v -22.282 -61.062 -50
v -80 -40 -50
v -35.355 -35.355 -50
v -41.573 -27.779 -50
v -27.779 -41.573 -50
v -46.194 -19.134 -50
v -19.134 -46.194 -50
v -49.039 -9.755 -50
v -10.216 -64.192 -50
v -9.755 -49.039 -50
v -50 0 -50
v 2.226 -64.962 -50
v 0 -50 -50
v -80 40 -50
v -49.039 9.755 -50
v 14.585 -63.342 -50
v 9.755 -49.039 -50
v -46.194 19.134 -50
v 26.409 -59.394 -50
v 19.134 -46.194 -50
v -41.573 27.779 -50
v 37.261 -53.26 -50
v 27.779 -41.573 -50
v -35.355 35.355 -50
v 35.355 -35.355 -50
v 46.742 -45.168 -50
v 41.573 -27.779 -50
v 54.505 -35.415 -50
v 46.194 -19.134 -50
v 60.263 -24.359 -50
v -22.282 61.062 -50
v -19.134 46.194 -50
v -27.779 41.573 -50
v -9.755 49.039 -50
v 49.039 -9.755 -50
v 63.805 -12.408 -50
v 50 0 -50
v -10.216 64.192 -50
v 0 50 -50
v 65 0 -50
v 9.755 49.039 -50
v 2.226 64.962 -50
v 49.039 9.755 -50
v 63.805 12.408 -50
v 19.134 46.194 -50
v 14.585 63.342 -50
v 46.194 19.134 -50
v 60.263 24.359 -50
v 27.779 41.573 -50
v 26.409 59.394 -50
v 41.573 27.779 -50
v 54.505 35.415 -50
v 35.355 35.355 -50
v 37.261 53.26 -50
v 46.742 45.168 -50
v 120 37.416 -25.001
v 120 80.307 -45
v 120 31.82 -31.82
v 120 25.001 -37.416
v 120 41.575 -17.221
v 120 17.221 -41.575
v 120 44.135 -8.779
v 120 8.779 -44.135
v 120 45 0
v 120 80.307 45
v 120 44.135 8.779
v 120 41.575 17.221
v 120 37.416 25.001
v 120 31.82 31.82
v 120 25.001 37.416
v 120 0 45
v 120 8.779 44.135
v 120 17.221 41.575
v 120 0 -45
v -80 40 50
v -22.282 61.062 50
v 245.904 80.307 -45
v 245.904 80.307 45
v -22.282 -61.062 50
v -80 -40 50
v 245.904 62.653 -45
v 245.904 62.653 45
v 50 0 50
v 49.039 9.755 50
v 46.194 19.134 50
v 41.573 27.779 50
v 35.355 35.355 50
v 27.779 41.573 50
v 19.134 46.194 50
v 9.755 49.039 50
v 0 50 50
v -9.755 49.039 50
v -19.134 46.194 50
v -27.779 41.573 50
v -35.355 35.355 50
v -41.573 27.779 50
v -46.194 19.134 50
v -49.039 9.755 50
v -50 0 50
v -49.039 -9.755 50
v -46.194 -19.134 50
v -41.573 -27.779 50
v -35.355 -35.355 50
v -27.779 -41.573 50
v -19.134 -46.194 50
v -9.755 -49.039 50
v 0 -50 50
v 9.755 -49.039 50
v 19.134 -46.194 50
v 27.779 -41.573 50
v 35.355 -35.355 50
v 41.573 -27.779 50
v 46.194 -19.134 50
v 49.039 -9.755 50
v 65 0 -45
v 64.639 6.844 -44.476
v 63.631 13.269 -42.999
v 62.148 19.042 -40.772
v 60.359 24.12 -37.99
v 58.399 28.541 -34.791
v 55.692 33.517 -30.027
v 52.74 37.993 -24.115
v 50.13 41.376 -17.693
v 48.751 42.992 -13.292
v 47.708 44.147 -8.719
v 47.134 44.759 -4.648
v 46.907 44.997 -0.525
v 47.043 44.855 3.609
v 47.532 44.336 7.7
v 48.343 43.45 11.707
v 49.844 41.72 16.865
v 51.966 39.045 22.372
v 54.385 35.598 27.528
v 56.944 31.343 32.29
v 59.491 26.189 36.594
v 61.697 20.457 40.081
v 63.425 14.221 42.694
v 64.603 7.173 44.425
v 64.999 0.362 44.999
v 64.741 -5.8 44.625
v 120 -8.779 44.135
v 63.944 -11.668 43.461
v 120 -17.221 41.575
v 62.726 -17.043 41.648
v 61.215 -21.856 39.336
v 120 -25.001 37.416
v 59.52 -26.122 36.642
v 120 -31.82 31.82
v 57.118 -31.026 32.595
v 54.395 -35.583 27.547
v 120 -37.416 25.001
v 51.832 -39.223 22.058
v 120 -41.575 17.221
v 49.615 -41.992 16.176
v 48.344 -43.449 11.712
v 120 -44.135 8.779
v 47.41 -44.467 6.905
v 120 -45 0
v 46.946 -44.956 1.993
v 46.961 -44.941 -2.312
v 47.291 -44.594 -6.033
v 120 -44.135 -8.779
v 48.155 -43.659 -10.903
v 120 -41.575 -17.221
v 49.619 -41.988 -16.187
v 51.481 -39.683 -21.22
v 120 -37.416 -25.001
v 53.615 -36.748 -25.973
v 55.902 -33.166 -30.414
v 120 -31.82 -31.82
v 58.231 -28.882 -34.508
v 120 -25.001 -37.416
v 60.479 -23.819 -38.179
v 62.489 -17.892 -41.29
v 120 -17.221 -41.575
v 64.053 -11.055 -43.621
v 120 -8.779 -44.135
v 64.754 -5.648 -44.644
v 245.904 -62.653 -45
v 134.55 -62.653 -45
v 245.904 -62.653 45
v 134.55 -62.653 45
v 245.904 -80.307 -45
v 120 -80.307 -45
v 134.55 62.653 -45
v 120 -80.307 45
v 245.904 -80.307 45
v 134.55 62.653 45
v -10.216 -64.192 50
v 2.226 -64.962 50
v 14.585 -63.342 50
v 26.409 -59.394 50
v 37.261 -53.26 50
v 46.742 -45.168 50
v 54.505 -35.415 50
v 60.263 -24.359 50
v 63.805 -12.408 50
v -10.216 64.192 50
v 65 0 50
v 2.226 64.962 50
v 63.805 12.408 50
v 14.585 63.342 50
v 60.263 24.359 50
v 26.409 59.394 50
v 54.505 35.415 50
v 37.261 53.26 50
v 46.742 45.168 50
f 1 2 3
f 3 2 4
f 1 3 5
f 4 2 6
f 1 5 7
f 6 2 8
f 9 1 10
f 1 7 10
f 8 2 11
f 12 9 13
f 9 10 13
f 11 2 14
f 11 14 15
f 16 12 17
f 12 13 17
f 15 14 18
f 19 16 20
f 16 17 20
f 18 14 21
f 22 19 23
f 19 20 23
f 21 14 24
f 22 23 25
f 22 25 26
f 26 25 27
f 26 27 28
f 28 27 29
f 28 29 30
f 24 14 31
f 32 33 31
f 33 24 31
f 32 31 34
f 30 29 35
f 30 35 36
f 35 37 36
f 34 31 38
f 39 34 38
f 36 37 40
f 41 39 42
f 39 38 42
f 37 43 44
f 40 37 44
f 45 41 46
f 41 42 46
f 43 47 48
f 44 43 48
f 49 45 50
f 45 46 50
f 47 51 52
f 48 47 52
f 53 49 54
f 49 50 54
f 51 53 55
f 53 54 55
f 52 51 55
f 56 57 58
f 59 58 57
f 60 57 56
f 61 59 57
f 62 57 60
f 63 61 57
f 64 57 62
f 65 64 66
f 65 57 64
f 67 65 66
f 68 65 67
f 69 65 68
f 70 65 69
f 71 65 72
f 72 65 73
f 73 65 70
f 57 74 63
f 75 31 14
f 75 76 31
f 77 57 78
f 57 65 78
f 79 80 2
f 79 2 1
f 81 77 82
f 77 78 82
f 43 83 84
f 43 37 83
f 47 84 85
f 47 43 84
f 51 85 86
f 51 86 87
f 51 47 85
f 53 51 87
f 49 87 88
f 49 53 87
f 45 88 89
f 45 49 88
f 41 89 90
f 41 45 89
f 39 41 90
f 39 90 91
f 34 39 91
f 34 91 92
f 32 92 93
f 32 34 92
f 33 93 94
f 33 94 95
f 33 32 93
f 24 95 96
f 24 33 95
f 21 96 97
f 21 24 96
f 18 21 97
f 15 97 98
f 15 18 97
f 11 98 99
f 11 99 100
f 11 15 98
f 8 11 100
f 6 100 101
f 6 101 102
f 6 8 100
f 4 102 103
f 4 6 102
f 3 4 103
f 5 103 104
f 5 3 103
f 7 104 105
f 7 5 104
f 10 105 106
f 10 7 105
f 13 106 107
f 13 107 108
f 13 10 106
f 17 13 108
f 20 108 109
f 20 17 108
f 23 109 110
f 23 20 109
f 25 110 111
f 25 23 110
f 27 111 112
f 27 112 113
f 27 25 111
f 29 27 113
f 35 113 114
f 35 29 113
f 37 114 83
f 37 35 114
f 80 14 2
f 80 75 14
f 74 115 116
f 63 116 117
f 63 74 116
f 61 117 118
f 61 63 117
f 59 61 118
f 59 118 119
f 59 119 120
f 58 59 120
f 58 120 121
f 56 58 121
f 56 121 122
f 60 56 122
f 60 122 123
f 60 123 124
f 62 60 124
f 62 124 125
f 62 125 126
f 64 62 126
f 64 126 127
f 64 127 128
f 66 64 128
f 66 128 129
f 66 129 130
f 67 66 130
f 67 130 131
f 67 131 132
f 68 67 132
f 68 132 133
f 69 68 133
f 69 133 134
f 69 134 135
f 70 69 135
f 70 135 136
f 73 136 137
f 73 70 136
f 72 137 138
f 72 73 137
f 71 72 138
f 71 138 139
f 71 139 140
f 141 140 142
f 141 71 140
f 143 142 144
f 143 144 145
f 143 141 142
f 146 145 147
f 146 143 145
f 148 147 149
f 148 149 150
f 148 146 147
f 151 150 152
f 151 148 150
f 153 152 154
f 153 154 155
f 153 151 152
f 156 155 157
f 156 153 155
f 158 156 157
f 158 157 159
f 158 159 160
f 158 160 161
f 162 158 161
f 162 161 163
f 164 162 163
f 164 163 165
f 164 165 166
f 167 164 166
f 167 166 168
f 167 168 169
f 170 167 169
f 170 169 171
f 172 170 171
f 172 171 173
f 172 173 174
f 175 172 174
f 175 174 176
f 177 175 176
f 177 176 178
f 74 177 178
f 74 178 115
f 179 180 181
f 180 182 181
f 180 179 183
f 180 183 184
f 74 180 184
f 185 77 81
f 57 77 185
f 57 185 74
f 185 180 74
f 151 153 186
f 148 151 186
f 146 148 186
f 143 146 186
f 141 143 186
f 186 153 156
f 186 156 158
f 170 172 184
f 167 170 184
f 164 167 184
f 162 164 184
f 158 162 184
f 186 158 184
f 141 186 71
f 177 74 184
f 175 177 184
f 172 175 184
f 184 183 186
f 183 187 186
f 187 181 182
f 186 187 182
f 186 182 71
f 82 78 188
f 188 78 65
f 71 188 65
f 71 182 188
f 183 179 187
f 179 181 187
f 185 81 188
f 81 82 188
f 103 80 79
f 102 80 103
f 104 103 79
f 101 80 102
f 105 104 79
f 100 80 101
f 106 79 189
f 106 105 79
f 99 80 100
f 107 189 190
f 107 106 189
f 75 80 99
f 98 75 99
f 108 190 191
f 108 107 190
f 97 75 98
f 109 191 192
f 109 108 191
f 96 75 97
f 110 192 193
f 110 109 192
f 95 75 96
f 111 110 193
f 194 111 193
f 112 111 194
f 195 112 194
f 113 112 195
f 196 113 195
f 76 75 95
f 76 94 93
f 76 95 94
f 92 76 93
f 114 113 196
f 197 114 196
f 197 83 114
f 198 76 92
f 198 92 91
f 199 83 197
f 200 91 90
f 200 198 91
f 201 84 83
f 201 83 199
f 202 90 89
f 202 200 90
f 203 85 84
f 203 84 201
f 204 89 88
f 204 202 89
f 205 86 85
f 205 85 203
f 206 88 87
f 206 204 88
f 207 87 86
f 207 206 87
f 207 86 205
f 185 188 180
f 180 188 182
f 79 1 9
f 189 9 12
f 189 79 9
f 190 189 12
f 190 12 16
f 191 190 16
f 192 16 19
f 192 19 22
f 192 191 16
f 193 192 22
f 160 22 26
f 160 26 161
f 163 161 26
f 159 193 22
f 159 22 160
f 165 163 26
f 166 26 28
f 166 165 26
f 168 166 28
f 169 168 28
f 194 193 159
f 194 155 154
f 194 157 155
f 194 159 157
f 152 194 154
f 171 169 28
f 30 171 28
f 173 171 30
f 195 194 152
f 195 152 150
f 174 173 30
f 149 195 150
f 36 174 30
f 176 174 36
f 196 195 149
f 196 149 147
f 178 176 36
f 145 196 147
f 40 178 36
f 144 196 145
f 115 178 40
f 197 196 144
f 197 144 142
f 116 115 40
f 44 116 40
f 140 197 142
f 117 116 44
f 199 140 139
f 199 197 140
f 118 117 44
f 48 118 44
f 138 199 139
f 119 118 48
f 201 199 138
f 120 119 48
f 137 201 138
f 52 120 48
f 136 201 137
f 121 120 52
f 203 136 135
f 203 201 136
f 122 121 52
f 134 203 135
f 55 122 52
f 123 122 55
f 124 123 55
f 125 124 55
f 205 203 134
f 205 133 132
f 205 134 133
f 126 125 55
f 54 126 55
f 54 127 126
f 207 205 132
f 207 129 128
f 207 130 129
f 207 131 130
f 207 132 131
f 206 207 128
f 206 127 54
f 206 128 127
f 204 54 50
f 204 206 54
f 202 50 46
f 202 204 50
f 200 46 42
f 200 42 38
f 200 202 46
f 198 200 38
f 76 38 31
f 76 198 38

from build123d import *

# Parameters (mm, degrees)
SKETCH1_R                = 50
BOSS_EXTRUDE1_DEPTH      = 50
BOSS_EXTRUDE2_REACH      = 202
SKETCH2_R                = 45
BOSS_EXTRUDE3_DEPTH      = 45
BOSS_EXTRUDE3_DEPTH_BACK = 45


with BuildPart() as part:
    # Sketch1 → Boss-Extrude1 (new body, symmetric)
    with BuildSketch(Plane.XY):
        with BuildLine():
            Line((-80, 40), (-80, -40))
            Line((-80, -40), (-22.281665693, -61.061668614))
            ThreePointArc((-22.281665693, -61.061668614), (65, 0), (-22.281665693, 61.061668614))
            Line((-22.281665693, 61.061668614), (-80, 40))
        make_face()
        Circle(SKETCH1_R, mode=Mode.SUBTRACT)
    extrude(amount=BOSS_EXTRUDE1_DEPTH, both=True)

    # Sketch2 → Boss-Extrude2 (add, up to next)
    with BuildSketch(Plane(origin=(120, 0, 0), x_dir=(0, 0, -1), z_dir=(1, 0, 0)), mode=Mode.PRIVATE) as boss_extrude2_sk1:
        Circle(SKETCH2_R)
    boss_extrude2_tool1 = extrude(boss_extrude2_sk1.sketch, amount=-BOSS_EXTRUDE2_REACH, mode=Mode.PRIVATE) - part.part
    add(boss_extrude2_tool1.solids().sort_by_distance((120, 0, 0))[0])

    # Sketch3 → Boss-Extrude3 (add, two sides)
    with BuildSketch(Plane.XY) as boss_extrude3_sk:
        Polygon((120, 45), (120, 80.306694099), (245.903834127, 80.306694099), (245.903834127, 62.653347049), (134.550333897, 62.653347049), (134.550333897, -62.653347049), (245.903834127, -62.653347049), (245.903834127, -80.306694099), (120, -80.306694099), (120, -45), align=None)
    extrude(amount=BOSS_EXTRUDE3_DEPTH)
    extrude(boss_extrude3_sk.sketch, amount=-BOSS_EXTRUDE3_DEPTH_BACK)


solid = part.part
